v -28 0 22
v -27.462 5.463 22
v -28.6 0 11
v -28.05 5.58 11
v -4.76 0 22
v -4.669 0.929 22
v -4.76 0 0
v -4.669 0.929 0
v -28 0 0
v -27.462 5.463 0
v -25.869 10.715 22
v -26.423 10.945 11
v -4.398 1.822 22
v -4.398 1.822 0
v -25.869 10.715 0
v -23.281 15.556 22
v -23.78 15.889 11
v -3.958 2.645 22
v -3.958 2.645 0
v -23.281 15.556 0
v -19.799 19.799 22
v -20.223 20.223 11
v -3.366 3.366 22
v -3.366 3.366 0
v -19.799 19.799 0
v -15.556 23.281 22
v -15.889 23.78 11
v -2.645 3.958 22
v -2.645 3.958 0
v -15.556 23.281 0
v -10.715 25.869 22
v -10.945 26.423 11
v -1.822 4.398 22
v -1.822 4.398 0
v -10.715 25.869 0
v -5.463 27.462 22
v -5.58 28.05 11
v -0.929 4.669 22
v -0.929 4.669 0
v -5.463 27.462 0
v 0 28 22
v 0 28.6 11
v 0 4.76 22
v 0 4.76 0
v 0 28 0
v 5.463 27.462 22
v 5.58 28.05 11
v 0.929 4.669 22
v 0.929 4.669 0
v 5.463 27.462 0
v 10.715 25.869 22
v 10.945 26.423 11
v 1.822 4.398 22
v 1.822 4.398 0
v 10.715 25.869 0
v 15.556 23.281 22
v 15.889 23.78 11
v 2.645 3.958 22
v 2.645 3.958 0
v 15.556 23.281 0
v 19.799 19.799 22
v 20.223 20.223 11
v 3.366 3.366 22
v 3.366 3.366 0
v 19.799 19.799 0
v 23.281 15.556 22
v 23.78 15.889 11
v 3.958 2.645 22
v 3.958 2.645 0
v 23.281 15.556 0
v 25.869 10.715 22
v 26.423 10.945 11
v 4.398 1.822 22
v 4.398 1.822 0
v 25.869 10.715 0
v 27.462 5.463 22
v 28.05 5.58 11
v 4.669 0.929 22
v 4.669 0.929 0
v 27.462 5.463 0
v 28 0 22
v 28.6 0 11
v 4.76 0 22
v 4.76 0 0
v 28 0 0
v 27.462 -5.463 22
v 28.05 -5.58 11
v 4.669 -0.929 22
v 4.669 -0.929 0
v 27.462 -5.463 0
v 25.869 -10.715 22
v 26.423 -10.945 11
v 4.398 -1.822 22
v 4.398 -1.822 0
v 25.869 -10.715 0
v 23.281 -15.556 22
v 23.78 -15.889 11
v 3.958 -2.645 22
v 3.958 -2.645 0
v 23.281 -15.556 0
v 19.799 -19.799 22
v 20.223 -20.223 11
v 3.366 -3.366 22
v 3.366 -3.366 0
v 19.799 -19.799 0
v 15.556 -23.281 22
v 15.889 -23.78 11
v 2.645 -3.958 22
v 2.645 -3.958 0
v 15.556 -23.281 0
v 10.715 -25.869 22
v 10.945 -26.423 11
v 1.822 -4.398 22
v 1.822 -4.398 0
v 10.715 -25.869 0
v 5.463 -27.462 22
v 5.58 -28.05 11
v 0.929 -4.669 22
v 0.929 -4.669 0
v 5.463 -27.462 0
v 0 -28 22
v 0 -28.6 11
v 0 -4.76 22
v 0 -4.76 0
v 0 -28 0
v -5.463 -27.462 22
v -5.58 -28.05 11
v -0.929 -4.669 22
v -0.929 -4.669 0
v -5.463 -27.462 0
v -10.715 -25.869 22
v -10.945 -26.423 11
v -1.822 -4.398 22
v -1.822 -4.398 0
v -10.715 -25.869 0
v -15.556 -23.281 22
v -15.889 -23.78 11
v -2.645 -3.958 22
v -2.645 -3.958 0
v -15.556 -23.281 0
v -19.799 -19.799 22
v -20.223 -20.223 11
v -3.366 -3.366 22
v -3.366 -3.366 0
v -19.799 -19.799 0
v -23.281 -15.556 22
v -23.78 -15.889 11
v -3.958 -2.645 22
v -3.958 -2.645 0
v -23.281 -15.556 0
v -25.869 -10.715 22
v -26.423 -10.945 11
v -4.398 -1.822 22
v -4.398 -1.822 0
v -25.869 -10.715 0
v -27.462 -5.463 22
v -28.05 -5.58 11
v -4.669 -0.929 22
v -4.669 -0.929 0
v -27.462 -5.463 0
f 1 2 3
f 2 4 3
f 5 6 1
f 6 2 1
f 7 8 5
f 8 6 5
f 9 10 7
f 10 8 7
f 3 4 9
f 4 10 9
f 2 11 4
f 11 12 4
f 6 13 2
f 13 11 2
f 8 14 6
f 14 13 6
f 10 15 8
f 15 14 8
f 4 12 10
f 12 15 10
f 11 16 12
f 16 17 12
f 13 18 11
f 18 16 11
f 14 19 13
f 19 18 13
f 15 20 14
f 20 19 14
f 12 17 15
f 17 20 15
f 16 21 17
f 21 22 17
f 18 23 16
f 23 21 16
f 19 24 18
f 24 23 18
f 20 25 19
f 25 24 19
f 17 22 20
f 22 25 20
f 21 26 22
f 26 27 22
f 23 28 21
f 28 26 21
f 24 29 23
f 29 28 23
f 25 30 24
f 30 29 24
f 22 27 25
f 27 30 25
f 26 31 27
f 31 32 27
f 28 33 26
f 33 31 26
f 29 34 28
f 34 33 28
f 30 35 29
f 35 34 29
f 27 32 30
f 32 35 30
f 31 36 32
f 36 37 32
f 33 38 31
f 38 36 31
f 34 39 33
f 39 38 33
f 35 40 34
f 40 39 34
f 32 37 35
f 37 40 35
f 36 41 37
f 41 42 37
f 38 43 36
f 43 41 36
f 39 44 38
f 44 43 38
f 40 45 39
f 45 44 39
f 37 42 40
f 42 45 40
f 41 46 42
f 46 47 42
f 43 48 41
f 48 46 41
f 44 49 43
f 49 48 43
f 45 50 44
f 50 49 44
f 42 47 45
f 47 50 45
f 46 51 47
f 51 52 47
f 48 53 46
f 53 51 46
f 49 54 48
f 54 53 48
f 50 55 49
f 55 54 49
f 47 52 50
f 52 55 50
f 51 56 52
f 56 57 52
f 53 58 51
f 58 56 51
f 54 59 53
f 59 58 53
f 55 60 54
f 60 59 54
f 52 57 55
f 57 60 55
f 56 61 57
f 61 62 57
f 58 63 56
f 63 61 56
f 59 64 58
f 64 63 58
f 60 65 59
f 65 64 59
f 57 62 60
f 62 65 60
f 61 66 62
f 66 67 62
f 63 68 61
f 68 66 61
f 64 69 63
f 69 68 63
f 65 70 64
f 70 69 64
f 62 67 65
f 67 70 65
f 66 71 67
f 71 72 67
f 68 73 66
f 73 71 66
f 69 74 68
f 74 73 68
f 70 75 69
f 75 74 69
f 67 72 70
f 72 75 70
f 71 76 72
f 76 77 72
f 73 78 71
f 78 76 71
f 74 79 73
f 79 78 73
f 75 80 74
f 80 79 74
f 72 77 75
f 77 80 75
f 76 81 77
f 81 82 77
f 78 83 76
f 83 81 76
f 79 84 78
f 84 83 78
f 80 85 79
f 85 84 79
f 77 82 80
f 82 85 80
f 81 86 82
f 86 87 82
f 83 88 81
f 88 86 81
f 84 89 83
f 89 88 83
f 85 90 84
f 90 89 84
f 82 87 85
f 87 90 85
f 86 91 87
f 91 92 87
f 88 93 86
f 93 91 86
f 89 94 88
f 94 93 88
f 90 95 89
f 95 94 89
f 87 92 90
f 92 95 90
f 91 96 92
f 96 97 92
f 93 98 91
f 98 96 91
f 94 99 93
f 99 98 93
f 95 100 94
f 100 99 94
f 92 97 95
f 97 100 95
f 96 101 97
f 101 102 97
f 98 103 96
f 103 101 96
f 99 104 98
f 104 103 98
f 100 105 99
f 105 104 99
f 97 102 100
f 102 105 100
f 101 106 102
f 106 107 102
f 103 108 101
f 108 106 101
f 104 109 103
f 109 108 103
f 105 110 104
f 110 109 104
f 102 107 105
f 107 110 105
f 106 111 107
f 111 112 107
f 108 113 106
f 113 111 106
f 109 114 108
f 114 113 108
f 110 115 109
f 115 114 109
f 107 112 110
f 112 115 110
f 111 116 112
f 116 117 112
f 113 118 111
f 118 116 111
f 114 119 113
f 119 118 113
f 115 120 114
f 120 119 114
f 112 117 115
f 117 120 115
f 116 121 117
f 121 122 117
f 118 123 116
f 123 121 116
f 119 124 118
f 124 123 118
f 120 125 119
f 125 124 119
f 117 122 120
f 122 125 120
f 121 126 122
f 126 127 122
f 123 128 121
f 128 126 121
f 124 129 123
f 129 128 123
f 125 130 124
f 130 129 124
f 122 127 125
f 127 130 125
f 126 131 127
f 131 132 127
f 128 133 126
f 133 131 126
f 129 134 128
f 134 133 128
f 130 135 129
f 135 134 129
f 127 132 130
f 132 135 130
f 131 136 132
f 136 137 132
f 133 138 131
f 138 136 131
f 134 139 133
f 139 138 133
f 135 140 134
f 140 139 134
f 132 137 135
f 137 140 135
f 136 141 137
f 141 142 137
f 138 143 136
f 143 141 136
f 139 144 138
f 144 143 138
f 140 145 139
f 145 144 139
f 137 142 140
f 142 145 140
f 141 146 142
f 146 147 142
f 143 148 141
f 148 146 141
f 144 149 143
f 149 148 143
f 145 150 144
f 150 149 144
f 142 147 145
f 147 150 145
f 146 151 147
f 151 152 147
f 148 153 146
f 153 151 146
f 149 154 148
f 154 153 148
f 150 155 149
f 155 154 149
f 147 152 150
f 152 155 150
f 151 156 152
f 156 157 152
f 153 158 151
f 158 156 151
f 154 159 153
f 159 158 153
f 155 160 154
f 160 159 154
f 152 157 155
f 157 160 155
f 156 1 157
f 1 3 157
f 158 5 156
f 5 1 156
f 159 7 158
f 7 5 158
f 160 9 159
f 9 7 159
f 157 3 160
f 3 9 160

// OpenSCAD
$fn = 32;

// ----------------------------------------------------------------------
// Belt roller: 56 mm barrel, 22 mm wide, bore 9.52 mm
// ----------------------------------------------------------------------

// --- parameters (mm) ---
bore_d = 9.52;            // bore
barrel_d = 56;            // barrel diameter
roller_w = 22;            // roller width
crown = 0.6;              // crown height at mid width

roller_profile = [[4.76, 0], [28, 0], [28.6, 11], [28, 22], [4.76, 22]];

/* the profile stays clear of the axis, so the bore comes out of the revolve */
rotate_extrude() polygon(roller_profile);
